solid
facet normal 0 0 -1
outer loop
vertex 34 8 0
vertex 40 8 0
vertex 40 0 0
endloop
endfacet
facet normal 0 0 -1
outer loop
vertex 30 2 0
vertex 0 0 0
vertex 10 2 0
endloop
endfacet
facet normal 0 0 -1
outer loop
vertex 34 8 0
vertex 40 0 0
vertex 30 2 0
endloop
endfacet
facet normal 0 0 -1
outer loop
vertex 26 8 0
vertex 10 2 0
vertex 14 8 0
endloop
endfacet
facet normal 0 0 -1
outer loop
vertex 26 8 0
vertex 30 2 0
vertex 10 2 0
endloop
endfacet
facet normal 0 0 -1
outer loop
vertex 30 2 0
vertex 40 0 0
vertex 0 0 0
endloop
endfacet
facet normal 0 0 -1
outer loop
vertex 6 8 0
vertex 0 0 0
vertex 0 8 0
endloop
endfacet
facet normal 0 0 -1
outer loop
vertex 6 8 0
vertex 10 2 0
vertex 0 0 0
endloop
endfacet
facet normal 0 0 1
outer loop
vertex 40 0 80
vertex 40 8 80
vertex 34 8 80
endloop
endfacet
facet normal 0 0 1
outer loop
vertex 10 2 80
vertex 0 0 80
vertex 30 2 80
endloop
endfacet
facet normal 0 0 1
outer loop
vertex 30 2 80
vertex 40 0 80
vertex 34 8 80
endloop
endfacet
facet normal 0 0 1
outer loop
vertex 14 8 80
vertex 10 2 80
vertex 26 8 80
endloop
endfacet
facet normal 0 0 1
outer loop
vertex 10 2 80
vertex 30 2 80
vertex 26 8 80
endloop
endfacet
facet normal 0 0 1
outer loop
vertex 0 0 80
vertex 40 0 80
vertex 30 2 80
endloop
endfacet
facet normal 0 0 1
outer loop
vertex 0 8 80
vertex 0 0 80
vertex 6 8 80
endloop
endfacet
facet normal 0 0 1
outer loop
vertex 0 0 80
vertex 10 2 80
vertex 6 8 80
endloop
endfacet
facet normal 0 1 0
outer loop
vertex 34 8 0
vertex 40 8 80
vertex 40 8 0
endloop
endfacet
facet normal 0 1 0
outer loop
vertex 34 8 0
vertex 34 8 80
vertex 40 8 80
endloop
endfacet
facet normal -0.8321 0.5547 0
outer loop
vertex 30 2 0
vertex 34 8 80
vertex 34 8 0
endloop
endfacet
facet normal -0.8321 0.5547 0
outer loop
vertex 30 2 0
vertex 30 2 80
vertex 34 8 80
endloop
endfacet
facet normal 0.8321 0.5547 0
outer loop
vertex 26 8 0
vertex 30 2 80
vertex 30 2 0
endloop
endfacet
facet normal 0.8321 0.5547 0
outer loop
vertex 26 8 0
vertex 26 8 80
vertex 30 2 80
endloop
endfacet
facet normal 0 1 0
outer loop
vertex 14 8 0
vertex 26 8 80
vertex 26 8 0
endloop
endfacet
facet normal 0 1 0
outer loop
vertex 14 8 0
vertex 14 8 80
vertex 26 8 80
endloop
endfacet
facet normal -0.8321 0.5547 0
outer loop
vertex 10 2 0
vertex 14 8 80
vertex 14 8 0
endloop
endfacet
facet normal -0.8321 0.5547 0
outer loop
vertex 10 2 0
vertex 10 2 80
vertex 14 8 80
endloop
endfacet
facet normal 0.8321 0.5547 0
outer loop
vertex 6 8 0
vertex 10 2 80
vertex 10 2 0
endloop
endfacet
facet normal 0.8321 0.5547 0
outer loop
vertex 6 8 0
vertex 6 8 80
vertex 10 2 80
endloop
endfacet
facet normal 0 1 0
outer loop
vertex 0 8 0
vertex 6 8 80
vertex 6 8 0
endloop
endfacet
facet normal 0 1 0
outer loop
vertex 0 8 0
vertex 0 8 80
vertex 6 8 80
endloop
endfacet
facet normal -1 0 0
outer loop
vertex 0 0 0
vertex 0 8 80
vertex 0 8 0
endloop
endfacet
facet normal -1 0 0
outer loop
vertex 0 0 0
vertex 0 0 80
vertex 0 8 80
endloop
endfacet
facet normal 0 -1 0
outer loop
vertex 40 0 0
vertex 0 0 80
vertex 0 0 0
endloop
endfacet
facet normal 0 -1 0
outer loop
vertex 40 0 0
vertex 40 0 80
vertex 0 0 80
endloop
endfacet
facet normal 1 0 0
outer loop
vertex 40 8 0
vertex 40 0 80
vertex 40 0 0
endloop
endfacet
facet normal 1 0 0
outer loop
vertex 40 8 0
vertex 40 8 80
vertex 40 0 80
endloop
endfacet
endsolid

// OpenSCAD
$fn = 32;

// ----------------------------------------------------------------------
// V guide rail: doublev, 40 mm wide
// ----------------------------------------------------------------------

// --- parameters (mm) ---
rail_w = 40;              // rail width, X
base_t = 8;               // base plate thickness
v_depth = 6;              // V feature depth / height
v_half_w = 8;             // half width of the V at the base face
plate_t = 80;             // rail length, Z (the extrusion height)
groove_off = 10;          // offset of each groove from the centreline
fit_tol = 0.1;            // declared fit tolerance (prompt contract)
free_tol = 0.3;           // declared free tolerance (prompt contract)

centre_x = rail_w / 2;  // rail centreline
groove_a = centre_x - groove_off;  // axis of the first groove
groove_b = centre_x + groove_off;  // axis of the second groove

profile = [[0, 0], [40, 0], [40, 8], [34, 8], [30, 2], [26, 8], [14, 8], [10, 2], [6, 8], [0, 8]];  // primary outline, 10 points, counter clockwise

// --- the one profile operation ---
linear_extrude(height = plate_t) polygon(points = profile);
